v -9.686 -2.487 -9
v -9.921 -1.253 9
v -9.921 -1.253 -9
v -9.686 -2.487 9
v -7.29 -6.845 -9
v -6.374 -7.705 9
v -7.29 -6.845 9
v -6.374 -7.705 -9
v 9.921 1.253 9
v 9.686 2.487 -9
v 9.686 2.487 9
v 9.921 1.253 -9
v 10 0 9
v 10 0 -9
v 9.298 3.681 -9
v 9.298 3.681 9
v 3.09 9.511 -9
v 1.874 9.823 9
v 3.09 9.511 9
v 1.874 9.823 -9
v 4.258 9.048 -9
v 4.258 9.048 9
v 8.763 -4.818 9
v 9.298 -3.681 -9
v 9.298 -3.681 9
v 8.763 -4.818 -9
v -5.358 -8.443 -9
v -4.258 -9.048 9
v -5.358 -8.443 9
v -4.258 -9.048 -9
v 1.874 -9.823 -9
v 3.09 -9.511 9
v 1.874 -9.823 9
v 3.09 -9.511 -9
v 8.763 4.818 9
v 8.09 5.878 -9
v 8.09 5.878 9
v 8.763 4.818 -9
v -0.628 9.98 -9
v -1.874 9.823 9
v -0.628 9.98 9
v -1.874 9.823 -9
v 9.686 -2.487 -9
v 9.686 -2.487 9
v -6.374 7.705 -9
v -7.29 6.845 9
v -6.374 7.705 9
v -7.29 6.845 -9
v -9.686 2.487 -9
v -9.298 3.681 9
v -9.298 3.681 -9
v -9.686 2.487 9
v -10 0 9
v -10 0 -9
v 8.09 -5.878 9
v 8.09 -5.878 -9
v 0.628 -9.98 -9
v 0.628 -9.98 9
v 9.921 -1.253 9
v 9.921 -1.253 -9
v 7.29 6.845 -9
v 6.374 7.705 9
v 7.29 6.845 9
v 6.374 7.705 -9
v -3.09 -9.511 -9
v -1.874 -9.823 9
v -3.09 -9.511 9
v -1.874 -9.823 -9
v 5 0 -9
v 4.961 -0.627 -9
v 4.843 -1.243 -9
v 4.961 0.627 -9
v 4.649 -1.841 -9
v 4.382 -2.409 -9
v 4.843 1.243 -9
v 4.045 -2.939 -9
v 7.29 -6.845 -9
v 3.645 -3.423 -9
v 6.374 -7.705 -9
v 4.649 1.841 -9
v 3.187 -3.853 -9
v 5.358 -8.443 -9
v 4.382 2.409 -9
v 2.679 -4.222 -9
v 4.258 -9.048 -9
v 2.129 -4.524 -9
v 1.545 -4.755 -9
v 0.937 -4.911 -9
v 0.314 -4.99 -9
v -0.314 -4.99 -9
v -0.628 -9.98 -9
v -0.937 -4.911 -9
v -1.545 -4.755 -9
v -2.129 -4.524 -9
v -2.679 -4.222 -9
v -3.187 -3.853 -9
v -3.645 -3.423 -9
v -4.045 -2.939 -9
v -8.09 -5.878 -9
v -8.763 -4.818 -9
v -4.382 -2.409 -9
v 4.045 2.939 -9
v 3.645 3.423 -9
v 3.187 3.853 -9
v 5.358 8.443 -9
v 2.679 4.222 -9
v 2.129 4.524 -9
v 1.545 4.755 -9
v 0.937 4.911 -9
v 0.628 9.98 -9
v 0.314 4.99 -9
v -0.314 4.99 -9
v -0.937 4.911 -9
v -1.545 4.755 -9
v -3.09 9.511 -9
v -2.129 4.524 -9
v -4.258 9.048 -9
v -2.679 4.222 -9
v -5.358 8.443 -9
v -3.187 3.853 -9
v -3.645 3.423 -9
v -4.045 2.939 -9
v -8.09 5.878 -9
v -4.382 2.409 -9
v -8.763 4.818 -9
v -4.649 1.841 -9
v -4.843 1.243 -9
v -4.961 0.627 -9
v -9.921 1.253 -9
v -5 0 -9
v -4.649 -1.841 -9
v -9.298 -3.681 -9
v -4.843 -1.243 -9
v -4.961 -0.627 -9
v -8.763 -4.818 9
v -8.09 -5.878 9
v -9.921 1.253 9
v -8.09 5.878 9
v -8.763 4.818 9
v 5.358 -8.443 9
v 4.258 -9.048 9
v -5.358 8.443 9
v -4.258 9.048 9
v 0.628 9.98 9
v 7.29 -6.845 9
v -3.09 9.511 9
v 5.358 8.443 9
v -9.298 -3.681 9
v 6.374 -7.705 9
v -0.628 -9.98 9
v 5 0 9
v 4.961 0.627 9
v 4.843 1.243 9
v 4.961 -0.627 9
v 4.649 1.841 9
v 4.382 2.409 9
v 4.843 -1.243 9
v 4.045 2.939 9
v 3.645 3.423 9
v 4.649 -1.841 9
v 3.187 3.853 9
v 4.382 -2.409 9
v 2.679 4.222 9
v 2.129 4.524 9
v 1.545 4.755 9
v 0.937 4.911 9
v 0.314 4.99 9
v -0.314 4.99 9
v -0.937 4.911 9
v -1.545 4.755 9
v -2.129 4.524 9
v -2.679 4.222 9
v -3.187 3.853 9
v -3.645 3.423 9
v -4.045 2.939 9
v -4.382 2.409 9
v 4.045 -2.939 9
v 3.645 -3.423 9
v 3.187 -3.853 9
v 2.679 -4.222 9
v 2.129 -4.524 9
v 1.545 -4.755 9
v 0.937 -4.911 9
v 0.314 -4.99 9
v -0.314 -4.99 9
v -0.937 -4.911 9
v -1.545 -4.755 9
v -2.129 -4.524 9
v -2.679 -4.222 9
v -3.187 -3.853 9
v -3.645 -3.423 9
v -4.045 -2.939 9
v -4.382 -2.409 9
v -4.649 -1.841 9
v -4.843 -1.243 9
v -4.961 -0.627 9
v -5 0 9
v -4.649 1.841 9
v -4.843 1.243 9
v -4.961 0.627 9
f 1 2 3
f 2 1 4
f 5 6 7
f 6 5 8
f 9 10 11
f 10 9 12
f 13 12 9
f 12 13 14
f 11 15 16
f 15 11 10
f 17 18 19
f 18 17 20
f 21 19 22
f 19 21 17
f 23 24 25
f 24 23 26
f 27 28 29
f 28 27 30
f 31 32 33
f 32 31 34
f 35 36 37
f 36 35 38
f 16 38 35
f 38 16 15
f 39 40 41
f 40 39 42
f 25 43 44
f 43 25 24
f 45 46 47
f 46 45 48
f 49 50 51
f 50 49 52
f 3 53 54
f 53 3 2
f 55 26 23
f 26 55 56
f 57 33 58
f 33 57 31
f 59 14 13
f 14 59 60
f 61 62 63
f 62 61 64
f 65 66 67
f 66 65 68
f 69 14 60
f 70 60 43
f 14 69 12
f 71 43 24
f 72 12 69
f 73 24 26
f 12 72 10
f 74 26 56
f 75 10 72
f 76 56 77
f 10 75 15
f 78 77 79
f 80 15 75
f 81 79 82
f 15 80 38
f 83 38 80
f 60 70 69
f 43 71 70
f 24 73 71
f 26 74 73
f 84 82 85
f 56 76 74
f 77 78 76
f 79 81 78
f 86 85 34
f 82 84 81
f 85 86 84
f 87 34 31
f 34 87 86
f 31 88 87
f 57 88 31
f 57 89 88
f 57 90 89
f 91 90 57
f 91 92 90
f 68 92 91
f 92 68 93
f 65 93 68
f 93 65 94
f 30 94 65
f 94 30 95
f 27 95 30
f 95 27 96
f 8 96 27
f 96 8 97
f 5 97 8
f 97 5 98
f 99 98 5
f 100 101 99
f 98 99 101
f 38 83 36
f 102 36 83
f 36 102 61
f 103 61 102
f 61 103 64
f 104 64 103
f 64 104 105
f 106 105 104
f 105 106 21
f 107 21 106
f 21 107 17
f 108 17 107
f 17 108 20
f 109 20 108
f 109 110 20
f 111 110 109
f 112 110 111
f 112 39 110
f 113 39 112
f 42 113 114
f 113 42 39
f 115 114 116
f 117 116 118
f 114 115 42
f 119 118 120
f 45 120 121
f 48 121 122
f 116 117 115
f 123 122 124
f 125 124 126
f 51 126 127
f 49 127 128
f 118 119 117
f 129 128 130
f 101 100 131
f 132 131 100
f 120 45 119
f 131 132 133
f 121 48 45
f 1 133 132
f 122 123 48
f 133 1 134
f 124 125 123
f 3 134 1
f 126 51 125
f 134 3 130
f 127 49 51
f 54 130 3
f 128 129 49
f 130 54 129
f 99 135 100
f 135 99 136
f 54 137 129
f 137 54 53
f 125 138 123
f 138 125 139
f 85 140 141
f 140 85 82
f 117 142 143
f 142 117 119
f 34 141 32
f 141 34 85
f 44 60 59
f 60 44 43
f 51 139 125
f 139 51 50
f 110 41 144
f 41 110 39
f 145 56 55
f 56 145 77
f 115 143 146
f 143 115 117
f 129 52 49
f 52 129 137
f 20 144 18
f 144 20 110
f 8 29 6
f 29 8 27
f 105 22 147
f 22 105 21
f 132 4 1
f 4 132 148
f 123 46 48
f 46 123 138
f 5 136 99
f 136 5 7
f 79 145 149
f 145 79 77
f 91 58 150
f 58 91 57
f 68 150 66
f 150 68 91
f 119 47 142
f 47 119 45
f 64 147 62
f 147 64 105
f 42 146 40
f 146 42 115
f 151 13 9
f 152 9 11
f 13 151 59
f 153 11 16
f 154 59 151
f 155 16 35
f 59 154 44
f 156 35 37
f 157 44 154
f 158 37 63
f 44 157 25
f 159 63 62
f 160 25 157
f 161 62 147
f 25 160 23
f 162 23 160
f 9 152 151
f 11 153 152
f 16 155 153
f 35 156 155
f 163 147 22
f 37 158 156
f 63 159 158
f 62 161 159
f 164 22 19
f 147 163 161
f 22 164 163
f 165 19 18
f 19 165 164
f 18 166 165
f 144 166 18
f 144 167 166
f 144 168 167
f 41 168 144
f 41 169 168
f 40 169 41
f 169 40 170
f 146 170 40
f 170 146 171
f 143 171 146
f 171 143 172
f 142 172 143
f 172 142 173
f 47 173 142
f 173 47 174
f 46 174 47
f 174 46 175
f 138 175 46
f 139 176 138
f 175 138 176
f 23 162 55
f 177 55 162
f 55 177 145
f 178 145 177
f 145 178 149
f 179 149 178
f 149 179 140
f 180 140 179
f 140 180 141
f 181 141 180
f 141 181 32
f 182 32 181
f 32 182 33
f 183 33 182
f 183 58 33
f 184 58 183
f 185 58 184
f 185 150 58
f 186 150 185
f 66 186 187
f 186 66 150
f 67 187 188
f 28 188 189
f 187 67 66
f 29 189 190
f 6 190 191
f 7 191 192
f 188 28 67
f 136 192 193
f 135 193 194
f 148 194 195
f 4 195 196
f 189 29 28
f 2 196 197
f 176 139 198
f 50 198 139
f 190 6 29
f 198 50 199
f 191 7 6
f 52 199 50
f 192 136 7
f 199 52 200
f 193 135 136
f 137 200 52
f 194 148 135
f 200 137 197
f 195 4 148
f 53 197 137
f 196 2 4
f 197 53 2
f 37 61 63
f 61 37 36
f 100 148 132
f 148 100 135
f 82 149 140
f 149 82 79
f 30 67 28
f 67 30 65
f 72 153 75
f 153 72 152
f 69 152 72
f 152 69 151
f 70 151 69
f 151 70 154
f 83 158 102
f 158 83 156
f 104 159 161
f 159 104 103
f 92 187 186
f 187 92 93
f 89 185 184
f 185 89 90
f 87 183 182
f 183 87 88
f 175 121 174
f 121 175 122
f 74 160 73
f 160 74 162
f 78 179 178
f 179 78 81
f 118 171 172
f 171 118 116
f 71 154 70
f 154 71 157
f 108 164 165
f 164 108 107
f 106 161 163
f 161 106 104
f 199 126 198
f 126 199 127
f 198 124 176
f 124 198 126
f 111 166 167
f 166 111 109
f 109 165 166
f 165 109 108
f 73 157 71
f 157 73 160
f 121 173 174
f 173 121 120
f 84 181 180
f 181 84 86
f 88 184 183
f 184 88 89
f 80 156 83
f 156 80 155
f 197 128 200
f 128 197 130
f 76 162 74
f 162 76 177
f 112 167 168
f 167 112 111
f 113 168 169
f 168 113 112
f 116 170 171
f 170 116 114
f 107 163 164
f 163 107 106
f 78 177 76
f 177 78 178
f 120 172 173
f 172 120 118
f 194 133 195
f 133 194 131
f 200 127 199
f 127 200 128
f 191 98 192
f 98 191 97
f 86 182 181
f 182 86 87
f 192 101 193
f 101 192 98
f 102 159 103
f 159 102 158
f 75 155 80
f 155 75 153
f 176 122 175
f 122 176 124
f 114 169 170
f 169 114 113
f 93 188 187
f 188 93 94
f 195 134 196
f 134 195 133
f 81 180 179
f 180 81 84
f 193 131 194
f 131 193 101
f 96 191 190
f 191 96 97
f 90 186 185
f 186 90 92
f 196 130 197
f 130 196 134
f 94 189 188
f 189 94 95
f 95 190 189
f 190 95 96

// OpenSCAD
$fn = 50;


difference() {
	union() {
		translate(v = [0, 0, -9.0000000000]) {
			cylinder(h = 18, r = 10.0000000000);
		}
	}
	union() {
		translate(v = [0, 0, -100.0000000000]) {
			cylinder(h = 200, r = 5.0000000000);
		}
	}
}
